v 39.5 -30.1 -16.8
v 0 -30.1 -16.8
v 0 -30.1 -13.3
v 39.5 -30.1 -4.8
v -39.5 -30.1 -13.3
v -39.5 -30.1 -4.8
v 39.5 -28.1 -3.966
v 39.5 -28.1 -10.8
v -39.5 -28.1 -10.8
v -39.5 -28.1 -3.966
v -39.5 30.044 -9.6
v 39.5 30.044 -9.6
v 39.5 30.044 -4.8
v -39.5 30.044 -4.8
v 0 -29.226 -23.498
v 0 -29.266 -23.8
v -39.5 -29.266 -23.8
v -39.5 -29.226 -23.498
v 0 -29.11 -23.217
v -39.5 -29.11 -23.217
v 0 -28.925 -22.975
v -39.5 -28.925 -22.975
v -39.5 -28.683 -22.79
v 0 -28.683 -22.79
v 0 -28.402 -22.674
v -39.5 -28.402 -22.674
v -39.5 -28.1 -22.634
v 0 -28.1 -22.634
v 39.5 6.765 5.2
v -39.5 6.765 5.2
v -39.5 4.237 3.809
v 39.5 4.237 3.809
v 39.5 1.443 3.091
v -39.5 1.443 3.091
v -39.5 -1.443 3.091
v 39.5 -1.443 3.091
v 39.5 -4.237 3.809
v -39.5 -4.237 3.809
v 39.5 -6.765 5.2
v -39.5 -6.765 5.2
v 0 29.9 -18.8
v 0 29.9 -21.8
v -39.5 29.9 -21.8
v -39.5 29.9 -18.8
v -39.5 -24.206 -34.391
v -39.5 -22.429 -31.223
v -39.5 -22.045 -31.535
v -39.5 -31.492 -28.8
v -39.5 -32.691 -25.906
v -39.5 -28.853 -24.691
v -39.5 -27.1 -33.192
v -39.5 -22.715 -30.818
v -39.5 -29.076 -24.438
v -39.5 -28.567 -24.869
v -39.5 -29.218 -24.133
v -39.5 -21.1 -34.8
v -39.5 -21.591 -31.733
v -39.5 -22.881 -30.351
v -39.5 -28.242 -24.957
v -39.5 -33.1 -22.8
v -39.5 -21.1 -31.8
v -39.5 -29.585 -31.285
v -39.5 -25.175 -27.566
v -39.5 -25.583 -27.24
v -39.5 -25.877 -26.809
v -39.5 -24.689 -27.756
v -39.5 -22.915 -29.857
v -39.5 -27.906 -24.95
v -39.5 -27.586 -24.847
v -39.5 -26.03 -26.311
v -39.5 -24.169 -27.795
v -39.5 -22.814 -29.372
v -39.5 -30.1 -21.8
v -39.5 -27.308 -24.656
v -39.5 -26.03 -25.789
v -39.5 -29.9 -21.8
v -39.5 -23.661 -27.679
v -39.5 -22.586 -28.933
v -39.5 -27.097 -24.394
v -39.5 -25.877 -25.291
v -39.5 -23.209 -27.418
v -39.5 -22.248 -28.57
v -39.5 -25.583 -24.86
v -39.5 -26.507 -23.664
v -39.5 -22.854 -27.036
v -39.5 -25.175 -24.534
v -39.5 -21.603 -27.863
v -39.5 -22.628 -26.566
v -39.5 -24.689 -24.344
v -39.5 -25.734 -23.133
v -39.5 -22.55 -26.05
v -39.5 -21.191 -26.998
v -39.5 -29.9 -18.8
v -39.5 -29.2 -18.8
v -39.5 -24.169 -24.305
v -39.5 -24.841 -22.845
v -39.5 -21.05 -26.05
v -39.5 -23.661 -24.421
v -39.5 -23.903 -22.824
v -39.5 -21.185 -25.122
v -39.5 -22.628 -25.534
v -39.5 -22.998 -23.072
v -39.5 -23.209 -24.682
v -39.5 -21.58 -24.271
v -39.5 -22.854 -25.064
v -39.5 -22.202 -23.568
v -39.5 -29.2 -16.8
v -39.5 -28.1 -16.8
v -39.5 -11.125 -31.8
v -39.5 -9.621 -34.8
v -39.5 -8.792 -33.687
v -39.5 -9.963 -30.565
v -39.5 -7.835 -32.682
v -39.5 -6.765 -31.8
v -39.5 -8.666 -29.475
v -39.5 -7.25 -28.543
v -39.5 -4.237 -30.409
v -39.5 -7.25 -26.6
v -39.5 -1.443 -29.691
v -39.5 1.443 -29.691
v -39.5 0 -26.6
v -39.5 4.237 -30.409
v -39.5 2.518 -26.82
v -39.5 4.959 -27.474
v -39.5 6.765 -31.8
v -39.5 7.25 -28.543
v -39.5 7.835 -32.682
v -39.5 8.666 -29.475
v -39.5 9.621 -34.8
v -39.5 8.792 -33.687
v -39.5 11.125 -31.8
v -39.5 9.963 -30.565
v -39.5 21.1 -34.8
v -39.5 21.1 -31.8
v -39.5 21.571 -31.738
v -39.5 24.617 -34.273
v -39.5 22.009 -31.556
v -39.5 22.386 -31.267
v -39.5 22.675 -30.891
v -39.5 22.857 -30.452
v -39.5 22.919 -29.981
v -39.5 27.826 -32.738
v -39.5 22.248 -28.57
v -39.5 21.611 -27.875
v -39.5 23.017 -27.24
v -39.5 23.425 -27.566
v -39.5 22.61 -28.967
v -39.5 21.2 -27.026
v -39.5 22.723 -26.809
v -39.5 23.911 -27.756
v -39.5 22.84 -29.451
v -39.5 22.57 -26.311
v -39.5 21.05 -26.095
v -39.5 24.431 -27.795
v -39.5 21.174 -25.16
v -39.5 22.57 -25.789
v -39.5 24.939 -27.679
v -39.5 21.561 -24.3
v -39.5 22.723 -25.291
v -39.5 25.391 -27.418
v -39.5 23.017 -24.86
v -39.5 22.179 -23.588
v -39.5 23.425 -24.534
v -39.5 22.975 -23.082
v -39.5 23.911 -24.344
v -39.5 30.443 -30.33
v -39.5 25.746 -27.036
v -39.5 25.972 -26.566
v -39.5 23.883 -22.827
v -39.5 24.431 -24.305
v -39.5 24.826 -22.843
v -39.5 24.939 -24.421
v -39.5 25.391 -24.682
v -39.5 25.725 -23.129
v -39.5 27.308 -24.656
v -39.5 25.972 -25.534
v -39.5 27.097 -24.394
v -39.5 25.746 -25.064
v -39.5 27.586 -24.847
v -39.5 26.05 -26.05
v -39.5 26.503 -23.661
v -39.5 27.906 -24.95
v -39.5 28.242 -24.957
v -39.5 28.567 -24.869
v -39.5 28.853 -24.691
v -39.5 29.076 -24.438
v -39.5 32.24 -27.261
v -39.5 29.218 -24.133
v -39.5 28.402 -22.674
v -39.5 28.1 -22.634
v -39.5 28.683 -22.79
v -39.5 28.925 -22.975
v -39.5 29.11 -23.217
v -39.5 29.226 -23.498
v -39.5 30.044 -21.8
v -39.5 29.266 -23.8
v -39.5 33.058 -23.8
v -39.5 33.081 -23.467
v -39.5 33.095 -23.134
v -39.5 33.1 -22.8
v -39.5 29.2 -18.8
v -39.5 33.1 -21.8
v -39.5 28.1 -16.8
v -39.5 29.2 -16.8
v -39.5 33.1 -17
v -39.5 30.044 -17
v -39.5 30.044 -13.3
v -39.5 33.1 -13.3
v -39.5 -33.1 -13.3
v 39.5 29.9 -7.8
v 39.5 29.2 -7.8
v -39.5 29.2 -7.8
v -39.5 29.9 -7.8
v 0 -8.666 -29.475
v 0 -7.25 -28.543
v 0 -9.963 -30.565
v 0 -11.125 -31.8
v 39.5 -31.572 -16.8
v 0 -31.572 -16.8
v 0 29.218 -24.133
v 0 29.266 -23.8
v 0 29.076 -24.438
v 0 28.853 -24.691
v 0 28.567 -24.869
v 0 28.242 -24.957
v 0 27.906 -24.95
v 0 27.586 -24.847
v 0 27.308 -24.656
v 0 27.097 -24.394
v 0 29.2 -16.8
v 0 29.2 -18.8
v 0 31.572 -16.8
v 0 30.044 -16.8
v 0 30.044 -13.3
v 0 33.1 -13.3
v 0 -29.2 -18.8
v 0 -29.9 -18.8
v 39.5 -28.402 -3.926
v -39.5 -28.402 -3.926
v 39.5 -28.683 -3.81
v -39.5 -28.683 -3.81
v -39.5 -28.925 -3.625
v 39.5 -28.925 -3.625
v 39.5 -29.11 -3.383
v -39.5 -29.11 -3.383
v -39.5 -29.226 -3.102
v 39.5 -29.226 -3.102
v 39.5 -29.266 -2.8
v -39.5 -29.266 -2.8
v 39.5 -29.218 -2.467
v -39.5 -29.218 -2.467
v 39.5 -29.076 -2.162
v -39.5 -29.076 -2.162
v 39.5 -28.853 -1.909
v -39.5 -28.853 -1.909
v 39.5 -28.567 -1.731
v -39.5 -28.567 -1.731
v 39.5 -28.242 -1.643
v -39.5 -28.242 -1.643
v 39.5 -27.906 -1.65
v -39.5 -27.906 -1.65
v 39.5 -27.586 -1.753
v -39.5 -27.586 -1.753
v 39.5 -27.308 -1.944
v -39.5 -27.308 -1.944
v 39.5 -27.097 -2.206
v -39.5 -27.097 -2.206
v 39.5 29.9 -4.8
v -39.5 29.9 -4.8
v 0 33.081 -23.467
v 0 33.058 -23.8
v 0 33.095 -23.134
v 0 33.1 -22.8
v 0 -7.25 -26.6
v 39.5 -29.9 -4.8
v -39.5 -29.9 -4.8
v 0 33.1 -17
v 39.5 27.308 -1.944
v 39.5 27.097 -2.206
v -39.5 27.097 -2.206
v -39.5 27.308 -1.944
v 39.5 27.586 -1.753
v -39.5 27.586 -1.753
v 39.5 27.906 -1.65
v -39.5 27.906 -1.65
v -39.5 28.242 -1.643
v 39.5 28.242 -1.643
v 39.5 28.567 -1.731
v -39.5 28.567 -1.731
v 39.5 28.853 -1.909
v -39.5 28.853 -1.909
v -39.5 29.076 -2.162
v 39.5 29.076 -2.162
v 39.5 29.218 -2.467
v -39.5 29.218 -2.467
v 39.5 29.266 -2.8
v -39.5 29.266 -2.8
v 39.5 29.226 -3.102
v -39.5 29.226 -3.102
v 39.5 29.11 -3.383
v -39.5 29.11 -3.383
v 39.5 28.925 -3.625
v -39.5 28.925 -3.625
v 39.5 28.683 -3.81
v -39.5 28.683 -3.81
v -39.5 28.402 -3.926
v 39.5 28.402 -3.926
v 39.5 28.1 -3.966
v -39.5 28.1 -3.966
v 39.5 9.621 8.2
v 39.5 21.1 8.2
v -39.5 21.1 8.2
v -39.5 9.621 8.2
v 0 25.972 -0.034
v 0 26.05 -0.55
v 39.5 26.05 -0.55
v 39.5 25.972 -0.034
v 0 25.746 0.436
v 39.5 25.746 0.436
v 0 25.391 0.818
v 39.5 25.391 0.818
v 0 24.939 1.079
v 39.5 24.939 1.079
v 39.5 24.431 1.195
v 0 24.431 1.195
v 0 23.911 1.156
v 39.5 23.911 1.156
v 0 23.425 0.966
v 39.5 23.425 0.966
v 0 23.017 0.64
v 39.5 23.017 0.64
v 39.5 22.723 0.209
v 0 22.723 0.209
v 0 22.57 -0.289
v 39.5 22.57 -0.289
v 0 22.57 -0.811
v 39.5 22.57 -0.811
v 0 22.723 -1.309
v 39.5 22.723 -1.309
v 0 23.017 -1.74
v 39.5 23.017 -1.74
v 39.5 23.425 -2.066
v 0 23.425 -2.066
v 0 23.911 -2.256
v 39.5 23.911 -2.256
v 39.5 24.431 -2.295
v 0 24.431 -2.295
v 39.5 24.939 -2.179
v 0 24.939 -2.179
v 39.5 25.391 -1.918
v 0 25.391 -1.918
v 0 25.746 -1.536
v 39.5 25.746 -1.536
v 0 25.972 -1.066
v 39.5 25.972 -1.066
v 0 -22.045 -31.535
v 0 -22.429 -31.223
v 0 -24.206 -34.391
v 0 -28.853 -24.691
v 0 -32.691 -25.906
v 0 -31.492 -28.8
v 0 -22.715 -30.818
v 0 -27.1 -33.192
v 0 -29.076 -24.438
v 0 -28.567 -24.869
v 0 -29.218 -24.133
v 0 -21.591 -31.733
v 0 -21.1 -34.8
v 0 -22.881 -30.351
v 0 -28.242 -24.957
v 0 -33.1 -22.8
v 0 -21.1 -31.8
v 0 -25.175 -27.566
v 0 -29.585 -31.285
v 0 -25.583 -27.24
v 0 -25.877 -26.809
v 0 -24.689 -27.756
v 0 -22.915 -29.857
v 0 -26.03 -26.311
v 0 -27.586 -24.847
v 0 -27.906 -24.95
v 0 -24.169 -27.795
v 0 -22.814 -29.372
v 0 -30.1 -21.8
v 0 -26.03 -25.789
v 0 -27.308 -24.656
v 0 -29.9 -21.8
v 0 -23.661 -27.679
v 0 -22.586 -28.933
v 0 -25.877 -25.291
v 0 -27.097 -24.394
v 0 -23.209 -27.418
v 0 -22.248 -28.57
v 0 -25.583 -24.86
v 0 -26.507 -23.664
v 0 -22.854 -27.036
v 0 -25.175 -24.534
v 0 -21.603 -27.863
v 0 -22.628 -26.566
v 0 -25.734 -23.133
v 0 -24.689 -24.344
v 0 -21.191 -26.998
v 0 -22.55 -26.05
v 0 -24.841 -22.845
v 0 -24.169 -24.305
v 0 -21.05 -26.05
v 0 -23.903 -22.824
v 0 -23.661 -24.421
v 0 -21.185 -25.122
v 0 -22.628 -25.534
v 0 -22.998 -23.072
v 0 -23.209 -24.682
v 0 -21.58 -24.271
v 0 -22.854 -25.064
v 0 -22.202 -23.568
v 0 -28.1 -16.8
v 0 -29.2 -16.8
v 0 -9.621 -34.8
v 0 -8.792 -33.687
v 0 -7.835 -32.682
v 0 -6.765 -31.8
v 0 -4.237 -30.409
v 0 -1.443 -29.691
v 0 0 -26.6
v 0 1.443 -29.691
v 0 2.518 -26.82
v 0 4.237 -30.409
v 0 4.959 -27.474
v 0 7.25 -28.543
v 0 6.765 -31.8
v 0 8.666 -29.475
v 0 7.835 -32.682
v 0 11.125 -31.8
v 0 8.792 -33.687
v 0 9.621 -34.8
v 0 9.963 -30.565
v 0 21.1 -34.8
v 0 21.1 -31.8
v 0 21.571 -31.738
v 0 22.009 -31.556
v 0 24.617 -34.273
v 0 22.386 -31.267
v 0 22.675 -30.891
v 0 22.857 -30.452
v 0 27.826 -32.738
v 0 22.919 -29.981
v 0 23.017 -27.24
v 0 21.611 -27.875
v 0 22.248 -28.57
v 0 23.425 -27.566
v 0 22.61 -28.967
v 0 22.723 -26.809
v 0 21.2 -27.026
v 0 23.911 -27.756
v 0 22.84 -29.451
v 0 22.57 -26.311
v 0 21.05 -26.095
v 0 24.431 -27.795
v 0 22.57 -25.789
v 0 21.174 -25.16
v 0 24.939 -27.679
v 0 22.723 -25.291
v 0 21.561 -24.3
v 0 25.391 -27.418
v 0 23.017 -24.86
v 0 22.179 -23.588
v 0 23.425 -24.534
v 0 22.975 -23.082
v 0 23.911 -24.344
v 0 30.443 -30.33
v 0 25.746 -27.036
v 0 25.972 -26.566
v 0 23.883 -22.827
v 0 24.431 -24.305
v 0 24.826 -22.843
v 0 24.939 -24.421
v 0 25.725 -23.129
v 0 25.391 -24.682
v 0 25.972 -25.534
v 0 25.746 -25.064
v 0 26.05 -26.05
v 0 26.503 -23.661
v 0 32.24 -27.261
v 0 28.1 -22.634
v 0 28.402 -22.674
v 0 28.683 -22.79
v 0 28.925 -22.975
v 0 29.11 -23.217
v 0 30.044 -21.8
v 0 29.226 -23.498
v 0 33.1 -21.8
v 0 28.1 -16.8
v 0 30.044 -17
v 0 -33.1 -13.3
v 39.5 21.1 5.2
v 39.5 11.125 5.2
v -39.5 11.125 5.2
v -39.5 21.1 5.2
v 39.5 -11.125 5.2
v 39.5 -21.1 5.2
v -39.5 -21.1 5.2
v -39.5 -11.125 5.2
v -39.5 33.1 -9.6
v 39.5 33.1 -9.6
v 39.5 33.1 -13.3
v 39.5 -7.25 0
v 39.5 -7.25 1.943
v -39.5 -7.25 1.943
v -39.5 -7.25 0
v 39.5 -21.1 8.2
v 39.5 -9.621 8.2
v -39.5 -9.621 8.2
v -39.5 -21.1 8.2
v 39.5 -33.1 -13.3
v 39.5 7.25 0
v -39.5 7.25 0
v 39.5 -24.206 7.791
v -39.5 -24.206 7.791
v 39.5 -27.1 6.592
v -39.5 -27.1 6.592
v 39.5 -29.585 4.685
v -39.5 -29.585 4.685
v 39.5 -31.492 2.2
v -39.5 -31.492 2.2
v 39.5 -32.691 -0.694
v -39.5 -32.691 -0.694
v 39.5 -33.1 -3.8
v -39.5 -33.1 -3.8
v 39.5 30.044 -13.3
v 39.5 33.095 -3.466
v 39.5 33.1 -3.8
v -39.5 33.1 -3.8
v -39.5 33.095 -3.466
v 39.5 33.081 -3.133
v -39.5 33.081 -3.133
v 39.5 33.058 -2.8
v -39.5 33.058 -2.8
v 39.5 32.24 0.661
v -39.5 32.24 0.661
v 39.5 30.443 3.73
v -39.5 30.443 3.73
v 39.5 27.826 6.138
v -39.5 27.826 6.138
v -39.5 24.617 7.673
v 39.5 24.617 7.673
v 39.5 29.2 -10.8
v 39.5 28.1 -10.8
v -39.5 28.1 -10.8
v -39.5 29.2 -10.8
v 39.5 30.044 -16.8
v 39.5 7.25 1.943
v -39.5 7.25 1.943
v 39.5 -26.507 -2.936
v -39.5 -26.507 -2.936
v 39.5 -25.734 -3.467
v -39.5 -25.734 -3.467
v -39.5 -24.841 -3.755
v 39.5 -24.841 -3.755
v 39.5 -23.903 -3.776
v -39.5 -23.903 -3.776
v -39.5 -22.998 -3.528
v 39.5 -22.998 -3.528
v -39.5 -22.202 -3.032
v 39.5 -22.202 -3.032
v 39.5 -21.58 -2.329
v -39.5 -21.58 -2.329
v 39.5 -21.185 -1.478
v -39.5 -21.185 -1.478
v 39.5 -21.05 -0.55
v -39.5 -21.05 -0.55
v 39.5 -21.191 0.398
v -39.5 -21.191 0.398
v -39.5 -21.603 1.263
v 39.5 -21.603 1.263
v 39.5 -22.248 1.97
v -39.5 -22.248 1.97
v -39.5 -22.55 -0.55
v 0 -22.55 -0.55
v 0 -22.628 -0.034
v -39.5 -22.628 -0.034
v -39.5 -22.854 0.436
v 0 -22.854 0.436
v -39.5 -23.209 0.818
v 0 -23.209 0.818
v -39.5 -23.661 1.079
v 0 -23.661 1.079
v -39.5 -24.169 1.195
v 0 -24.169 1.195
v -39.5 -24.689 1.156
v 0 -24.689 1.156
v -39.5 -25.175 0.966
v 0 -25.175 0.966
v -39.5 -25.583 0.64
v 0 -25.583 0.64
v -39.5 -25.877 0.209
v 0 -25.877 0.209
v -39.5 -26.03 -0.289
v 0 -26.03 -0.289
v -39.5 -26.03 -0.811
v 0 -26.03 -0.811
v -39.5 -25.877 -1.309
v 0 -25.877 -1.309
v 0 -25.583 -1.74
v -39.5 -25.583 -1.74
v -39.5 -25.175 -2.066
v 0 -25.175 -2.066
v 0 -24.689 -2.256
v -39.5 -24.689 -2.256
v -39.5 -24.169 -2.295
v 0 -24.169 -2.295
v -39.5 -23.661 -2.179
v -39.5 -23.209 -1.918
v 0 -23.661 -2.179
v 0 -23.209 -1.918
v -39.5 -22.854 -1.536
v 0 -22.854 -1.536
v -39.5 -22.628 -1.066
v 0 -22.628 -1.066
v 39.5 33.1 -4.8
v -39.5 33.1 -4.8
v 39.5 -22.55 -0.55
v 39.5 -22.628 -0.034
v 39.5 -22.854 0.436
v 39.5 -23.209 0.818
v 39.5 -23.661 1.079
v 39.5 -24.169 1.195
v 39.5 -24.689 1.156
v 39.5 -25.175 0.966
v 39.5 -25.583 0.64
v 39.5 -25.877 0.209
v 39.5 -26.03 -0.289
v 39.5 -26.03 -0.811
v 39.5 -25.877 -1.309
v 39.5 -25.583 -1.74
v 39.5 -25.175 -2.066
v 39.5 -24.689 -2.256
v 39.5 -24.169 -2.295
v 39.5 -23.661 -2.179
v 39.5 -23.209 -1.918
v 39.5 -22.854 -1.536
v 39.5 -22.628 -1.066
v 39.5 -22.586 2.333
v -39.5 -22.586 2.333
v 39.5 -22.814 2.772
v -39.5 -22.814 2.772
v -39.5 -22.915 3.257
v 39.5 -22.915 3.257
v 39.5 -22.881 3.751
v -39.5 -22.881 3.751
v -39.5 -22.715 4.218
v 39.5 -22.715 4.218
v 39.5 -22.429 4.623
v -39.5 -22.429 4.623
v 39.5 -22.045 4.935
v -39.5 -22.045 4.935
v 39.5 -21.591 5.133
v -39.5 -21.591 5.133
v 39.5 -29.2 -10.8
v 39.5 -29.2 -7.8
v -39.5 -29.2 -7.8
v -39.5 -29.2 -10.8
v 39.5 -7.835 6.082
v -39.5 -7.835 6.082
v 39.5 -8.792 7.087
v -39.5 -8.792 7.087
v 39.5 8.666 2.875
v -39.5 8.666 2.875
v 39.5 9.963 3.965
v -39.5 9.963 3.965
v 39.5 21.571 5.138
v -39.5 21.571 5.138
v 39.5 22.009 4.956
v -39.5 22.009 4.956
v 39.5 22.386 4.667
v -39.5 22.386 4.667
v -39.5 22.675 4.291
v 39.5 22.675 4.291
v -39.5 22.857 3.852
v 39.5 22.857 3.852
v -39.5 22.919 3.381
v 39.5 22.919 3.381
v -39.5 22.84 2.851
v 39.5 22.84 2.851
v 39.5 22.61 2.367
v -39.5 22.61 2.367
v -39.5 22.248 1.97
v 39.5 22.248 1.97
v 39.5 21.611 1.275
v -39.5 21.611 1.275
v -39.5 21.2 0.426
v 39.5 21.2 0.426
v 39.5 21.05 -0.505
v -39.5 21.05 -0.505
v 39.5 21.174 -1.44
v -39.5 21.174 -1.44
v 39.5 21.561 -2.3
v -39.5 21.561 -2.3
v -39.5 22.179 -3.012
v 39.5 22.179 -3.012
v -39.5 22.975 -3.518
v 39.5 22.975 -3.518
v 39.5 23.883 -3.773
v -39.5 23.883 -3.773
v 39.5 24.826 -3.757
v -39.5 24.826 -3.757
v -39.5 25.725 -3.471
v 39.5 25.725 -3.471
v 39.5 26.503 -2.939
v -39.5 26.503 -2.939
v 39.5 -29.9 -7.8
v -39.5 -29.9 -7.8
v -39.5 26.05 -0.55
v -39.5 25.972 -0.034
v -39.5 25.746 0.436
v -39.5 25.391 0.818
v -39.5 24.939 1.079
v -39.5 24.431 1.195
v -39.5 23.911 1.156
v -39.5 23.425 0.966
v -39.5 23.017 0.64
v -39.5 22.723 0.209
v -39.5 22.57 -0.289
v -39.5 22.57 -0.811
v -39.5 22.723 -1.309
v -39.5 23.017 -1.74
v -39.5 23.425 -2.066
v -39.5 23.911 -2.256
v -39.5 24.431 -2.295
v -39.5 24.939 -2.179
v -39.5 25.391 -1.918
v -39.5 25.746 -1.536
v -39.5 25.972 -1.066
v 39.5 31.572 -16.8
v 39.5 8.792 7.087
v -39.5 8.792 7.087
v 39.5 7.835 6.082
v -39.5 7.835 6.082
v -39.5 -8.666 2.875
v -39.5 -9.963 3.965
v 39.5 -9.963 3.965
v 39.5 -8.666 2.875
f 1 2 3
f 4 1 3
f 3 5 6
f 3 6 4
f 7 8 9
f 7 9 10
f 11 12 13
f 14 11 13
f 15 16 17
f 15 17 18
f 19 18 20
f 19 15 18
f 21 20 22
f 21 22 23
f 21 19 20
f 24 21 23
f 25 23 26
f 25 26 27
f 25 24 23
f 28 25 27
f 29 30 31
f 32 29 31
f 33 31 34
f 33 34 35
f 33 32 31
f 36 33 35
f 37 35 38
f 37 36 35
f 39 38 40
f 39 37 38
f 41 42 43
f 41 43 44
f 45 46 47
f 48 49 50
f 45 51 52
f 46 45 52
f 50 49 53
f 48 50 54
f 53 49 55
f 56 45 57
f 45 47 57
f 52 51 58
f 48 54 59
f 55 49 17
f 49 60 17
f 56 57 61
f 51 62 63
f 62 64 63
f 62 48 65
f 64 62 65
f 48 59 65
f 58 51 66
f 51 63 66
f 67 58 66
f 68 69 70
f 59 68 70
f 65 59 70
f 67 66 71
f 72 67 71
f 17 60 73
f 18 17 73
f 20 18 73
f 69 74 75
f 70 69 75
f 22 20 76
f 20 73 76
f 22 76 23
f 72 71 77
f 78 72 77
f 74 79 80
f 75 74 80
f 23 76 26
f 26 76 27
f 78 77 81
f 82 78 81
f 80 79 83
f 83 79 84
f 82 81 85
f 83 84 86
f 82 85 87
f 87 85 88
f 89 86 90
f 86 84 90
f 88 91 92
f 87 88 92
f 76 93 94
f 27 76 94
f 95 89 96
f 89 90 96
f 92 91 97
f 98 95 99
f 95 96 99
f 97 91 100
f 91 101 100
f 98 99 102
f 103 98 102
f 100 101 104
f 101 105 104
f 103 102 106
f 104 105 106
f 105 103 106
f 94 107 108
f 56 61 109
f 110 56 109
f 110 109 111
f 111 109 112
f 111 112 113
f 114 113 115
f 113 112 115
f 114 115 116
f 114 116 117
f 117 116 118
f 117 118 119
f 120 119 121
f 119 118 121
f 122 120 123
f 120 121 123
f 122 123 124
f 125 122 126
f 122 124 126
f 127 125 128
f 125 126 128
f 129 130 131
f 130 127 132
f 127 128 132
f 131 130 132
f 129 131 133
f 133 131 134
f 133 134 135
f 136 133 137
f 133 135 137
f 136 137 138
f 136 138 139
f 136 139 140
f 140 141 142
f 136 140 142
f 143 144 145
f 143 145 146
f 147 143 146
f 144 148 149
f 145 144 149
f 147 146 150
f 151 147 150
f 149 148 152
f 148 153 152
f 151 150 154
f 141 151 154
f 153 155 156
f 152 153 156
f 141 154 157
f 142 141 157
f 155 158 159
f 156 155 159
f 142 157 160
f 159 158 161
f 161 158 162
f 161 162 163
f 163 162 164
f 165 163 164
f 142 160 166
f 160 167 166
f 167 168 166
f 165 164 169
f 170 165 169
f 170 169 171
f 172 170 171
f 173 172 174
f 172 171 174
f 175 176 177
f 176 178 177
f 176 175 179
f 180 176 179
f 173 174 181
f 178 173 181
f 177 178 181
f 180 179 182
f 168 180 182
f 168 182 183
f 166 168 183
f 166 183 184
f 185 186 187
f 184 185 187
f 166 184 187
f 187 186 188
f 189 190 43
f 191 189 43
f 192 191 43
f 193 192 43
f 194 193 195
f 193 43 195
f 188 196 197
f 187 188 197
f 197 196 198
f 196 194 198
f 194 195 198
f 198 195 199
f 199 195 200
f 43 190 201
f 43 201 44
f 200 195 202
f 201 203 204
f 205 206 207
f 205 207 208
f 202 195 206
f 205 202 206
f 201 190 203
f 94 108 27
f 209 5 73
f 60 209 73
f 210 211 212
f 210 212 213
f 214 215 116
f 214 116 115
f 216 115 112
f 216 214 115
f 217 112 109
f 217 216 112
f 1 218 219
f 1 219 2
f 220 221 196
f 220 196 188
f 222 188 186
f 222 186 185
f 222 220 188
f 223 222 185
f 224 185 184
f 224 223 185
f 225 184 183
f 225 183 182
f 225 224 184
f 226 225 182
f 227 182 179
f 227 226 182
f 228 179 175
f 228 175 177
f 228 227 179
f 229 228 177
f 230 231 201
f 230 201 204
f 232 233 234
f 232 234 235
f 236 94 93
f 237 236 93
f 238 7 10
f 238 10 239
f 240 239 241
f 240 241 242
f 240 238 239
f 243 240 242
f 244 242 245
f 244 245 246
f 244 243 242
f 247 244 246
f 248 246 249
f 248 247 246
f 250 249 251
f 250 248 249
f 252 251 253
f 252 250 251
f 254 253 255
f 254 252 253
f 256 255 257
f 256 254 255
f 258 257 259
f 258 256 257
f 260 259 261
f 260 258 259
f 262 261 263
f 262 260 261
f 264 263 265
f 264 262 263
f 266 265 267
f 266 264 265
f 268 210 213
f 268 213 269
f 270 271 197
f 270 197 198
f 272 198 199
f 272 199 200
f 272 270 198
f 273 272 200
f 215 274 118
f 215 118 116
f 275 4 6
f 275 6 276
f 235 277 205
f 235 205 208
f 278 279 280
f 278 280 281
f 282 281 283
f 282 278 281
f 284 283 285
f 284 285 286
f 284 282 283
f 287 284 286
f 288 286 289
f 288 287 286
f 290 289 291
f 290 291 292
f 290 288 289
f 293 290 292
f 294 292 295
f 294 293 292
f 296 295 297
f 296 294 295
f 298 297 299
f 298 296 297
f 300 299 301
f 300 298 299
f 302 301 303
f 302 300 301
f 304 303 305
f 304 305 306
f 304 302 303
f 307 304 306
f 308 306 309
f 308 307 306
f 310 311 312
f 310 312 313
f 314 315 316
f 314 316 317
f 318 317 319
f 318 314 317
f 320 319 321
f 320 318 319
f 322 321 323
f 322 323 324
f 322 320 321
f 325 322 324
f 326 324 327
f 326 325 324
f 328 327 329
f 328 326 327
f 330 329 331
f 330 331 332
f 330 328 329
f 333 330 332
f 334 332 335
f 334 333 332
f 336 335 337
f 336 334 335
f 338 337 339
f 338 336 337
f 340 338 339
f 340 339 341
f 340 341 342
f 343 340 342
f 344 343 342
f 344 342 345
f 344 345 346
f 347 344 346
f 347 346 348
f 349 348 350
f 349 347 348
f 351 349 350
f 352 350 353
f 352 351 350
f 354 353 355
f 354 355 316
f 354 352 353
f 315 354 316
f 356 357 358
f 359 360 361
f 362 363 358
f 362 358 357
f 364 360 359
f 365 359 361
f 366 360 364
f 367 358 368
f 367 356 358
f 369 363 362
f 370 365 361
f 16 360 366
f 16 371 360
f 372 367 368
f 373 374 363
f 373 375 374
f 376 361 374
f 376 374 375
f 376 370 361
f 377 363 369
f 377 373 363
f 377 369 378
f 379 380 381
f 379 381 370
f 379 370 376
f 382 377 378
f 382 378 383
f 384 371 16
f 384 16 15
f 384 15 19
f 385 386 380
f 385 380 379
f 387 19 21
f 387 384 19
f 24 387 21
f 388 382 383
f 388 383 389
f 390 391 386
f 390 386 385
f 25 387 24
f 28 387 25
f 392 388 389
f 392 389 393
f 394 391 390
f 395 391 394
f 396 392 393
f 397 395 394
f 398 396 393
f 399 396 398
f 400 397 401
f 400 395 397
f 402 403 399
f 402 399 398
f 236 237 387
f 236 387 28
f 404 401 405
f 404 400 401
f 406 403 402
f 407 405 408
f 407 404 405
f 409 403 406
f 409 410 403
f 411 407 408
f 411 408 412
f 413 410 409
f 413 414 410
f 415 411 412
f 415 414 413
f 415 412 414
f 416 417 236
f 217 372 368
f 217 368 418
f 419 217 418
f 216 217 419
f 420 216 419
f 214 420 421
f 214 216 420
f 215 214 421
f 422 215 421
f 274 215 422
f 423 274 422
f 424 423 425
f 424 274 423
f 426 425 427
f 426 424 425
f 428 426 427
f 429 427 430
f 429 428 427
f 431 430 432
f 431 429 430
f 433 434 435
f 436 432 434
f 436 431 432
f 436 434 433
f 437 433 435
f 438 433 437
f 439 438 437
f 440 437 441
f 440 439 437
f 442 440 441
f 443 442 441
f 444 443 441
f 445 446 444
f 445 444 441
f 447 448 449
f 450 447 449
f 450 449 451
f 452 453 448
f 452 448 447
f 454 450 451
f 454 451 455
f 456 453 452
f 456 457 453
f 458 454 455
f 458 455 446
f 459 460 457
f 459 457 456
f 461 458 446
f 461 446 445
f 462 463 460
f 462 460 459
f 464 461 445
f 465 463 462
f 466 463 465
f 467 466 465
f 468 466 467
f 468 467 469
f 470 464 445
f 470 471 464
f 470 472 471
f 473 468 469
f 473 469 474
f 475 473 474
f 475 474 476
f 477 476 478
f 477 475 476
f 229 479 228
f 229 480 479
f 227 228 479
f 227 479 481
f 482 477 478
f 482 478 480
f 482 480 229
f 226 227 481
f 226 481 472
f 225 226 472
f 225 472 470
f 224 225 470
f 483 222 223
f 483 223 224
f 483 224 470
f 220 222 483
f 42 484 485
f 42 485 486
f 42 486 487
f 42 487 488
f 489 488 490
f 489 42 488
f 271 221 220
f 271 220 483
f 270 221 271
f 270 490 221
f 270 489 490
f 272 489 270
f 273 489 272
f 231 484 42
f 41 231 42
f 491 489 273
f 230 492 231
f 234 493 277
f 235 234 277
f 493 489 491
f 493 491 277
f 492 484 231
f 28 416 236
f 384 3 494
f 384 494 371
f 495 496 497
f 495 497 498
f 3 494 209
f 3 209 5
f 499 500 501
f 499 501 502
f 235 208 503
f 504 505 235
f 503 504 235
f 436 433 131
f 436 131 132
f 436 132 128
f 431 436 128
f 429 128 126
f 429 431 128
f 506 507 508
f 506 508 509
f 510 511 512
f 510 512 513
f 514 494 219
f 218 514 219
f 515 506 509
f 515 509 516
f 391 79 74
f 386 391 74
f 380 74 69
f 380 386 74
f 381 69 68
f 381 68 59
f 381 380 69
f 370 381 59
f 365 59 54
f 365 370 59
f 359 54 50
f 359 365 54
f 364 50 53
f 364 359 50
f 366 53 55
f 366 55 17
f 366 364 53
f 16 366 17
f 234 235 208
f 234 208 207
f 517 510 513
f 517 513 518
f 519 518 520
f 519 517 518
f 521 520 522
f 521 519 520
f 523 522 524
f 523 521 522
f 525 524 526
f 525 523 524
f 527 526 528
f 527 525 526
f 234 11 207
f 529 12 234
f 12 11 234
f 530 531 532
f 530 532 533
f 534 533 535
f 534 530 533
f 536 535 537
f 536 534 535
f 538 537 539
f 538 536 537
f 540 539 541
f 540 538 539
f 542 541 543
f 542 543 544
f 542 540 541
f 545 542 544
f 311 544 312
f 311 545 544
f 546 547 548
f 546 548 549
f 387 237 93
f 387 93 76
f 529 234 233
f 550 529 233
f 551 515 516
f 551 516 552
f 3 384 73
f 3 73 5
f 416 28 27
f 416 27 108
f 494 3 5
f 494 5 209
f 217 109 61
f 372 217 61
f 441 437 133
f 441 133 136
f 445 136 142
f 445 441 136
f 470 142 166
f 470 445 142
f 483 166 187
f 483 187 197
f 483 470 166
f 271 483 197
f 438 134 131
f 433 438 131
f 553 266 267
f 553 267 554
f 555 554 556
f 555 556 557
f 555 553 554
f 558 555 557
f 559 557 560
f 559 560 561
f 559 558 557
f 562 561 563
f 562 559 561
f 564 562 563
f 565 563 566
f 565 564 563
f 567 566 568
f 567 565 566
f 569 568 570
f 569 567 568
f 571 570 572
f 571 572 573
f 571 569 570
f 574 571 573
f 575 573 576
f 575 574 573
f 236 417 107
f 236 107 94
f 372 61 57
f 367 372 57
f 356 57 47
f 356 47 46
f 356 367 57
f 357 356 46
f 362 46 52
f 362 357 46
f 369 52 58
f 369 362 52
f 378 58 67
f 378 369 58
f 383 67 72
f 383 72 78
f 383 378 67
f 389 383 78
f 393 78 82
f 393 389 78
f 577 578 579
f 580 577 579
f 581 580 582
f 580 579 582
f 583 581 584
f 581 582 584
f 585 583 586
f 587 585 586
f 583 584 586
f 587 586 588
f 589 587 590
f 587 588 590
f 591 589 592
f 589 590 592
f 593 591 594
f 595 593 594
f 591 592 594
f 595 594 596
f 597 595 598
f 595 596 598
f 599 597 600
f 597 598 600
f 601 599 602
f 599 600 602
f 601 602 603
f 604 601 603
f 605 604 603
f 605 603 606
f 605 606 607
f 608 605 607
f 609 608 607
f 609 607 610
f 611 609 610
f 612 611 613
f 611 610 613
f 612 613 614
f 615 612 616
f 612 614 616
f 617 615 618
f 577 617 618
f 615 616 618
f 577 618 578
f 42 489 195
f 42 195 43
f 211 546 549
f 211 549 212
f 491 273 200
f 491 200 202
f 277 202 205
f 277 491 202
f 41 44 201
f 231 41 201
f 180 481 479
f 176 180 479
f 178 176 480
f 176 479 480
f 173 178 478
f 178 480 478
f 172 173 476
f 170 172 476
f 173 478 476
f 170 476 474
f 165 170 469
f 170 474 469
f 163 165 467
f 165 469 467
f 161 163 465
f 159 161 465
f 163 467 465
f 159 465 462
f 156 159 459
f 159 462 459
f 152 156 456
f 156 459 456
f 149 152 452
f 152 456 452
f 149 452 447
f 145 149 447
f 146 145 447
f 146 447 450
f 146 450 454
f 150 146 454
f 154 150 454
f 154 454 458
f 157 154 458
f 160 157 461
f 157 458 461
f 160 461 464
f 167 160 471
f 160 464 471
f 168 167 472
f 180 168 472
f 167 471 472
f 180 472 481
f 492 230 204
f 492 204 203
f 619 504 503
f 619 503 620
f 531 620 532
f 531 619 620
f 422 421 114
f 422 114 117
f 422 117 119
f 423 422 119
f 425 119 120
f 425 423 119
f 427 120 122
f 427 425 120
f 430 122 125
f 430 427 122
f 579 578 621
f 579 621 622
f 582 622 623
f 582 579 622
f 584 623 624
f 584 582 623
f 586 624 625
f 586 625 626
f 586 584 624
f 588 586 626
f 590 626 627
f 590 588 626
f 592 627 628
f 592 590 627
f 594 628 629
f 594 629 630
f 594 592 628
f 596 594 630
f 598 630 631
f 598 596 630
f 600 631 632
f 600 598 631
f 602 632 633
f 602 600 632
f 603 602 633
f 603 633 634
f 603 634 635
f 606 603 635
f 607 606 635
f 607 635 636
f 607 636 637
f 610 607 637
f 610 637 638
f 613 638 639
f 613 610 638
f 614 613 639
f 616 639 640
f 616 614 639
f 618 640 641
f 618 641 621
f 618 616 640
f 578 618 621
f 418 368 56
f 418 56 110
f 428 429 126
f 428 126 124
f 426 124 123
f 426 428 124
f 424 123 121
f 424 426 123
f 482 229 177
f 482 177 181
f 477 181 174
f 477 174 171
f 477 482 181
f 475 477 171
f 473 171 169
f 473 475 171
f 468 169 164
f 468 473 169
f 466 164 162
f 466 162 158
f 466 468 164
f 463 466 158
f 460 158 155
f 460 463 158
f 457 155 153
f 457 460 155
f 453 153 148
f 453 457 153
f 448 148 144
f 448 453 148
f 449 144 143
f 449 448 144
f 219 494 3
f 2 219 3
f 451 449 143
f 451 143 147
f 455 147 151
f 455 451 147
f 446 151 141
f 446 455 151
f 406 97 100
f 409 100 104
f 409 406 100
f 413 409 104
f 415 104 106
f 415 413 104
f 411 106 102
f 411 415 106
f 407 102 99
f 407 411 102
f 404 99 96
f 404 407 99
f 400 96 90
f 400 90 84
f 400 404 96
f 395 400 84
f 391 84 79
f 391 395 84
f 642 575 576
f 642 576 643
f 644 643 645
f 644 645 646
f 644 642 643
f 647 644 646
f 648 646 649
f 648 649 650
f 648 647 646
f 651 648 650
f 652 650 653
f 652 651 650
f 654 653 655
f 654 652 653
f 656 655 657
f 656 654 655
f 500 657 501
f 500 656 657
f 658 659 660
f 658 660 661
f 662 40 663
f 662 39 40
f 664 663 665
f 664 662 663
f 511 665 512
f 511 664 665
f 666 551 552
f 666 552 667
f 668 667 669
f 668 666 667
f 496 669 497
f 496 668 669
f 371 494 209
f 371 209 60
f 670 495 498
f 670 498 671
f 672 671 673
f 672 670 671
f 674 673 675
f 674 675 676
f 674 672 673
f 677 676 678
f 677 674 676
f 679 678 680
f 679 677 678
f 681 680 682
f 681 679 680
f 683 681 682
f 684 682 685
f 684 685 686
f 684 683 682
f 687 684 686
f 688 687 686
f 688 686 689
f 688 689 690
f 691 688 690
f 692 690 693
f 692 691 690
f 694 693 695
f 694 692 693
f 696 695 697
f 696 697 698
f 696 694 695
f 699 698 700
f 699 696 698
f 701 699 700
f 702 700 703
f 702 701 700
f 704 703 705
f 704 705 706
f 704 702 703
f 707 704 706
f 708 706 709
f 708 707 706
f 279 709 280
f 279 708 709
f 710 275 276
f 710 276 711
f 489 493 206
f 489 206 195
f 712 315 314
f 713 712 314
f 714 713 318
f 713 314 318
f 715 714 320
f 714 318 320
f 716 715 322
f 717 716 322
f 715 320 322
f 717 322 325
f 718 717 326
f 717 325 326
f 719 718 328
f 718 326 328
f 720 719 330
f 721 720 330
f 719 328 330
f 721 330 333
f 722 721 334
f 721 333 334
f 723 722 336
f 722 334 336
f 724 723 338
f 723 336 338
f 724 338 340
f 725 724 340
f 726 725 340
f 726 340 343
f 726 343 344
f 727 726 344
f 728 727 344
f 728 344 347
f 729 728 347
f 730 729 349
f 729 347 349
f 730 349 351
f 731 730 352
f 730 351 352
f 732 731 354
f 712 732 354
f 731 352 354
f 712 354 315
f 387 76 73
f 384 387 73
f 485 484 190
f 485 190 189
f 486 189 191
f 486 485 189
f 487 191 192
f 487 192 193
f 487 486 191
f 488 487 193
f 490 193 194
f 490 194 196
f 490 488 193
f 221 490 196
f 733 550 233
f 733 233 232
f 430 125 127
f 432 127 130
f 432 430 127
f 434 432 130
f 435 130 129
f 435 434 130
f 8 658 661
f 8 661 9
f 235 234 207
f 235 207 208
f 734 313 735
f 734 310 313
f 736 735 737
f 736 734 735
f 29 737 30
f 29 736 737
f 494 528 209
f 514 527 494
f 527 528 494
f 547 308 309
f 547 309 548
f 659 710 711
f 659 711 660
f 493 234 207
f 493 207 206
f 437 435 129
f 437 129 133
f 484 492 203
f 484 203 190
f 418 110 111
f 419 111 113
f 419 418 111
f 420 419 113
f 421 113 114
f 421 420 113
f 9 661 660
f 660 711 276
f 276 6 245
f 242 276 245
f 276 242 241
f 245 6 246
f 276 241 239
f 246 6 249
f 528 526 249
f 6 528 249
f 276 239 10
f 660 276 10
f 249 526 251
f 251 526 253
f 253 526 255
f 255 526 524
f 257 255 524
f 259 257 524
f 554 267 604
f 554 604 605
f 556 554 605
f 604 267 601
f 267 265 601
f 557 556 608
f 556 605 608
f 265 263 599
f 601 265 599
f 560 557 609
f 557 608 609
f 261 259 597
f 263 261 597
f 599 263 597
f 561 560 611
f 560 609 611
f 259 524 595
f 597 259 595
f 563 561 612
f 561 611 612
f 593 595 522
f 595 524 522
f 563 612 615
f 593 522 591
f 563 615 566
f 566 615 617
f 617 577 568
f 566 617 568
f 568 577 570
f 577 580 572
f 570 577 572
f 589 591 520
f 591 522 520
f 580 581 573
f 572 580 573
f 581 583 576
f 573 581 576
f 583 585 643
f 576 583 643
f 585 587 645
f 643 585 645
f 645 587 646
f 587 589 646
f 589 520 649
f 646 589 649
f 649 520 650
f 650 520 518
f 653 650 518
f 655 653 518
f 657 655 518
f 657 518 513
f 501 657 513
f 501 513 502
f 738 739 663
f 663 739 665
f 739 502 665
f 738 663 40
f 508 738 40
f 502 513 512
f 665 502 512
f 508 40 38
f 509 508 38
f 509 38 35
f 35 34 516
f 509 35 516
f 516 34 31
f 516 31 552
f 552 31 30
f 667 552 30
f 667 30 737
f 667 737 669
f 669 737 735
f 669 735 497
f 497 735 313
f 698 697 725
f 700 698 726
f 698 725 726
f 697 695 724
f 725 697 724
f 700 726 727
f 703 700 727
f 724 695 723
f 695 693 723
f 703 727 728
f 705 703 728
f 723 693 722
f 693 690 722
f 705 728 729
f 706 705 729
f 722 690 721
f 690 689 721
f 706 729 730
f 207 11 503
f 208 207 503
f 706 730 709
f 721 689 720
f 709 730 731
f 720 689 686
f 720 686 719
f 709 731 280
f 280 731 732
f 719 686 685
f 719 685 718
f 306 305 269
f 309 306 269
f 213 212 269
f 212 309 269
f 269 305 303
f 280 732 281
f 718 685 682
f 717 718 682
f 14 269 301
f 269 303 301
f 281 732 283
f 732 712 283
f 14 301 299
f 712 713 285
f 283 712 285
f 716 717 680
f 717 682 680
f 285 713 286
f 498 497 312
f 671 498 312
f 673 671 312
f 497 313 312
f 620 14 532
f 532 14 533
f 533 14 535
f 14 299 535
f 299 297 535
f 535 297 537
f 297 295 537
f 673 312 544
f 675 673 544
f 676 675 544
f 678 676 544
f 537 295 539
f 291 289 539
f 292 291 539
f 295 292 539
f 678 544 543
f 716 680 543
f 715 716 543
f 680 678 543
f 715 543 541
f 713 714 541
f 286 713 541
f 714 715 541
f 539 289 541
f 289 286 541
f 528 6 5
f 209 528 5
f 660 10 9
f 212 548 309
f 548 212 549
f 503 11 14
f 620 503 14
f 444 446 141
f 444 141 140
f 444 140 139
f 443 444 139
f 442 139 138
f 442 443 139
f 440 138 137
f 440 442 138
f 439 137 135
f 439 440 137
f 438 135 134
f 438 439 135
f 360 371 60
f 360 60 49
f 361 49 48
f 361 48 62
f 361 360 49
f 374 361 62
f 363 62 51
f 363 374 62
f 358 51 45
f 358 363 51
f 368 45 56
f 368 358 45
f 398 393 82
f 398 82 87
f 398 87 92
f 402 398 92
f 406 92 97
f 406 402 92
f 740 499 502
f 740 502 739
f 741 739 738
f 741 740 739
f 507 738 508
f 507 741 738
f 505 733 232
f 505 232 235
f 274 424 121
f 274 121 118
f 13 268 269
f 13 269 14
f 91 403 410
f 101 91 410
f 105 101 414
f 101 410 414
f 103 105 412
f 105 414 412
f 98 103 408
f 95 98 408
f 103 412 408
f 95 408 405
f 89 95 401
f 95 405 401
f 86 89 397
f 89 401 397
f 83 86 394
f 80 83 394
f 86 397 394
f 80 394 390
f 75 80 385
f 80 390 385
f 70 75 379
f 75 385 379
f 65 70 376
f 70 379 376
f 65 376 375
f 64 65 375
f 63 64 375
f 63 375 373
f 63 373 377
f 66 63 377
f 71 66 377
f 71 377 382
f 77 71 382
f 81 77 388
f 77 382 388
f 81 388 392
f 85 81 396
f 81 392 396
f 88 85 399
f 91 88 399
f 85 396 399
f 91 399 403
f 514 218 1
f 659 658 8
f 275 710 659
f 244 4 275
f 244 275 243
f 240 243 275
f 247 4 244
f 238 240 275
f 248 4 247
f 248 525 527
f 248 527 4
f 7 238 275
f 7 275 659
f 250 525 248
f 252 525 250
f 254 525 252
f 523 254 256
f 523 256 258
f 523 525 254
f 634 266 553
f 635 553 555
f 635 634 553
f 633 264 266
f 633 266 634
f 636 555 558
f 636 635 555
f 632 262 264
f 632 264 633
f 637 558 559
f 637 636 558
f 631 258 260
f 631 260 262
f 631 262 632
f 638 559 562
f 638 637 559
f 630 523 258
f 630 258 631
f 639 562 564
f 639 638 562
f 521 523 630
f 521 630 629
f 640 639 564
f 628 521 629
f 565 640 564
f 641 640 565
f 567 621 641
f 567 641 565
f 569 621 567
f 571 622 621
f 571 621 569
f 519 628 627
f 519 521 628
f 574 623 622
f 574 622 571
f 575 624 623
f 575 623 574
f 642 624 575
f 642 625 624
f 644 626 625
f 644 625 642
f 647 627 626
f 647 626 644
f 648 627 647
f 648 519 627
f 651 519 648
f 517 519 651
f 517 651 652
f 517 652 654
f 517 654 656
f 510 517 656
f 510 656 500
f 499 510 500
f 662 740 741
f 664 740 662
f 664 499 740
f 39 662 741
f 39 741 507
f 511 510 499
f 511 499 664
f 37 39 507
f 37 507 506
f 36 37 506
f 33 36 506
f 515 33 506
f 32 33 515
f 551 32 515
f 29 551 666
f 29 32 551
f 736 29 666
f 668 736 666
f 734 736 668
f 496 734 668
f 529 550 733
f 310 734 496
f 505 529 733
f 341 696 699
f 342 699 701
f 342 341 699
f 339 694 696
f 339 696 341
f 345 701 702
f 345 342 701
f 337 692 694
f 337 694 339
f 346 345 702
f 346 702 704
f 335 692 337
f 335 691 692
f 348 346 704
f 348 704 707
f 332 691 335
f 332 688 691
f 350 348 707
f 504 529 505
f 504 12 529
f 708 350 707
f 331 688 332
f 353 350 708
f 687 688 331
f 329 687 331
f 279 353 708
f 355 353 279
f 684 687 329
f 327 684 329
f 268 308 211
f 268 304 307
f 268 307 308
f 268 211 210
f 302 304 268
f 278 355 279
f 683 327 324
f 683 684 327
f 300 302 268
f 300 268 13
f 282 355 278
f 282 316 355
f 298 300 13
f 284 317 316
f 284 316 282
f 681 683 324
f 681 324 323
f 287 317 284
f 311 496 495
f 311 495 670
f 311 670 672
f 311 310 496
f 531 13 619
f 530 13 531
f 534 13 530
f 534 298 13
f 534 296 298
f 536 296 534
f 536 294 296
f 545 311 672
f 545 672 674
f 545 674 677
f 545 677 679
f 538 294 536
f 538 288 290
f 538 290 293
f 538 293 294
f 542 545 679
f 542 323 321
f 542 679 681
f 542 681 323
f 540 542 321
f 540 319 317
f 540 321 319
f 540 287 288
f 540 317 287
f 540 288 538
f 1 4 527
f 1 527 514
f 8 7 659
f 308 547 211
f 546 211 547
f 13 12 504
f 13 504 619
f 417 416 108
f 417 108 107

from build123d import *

# Parameters (mm, degrees)
F0_R     = 1.75
F0_W     = 3.0557280899
F0_H     = 4.8
F0_W_2   = 1.1
F0_H_2   = 1.0000000006
F1_DEPTH = 39.5
F2_DEPTH = 39.5
F3_DEPTH = 39.5


with BuildPart() as f1:
    # F0 (on Right) → F1 (new body, symmetric)
    with BuildSketch(Plane.YZ):
        with BuildLine():
            Line((-9.6208107766, 8.2), (-13.0598621739, 8.2))
            ThreePointArc((-13.0598621739, 8.2), (-12.184983894, 6.6402183553), (-11.1247471881, 5.2))
            Line((-11.1247471881, 5.2), (-6.7646138101, 5.2))
            ThreePointArc((-6.7646138101, 5.2), (-8.3288975694, 6.5703426759), (-9.6208107766, 8.2))
        make_face()
        with BuildLine():
            Line((-6.7646138101, 5.2), (-11.1247471881, 5.2))
            ThreePointArc((-11.1247471881, 5.2), (-9.3306187205, 3.400921016), (-7.25, 1.9426316451))
            Line((-7.25, 1.9426316451), (7.25, 1.9426316451))
            ThreePointArc((7.25, 1.9426316451), (9.3306187205, 3.400921016), (11.1247471881, 5.2))
            Line((11.1247471881, 5.2), (6.7646138101, 5.2))
            ThreePointArc((6.7646138101, 5.2), (0, 3), (-6.7646138101, 5.2))
        make_face()
        with BuildLine():
            ThreePointArc((0, 0), (-3.752876154, 0.4940755188), (-7.25, 1.9426316451))
            Line((-7.25, 1.9426316451), (-7.25, 0))
            Line((-7.25, 0), (0, 0))
        make_face()
        with BuildLine():
            Line((7.25, 1.9426316451), (-7.25, 1.9426316451))
            ThreePointArc((-7.25, 1.9426316451), (-3.752876154, 0.4940755188), (0, 0))
            ThreePointArc((0, 0), (3.752876154, 0.4940755188), (7.25, 1.9426316451))
        make_face()
        with BuildLine():
            ThreePointArc((7.25, 1.9426316451), (3.752876154, 0.4940755188), (0, 0))
            Line((0, 0), (7.25, 0))
            Line((7.25, 0), (7.25, 1.9426316451))
        make_face()
        with BuildLine():
            Line((13.0598621739, 8.2), (9.6208107766, 8.2))
            ThreePointArc((9.6208107766, 8.2), (8.3288975694, 6.5703426759), (6.7646138101, 5.2))
            Line((6.7646138101, 5.2), (11.1247471881, 5.2))
            ThreePointArc((11.1247471881, 5.2), (12.184983894, 6.6402183553), (13.0598621739, 8.2))
        make_face()
        with BuildLine():
            Line((21.1, 8.2), (13.0598621739, 8.2))
            ThreePointArc((13.0598621739, 8.2), (12.184983894, 6.6402183553), (11.1247471881, 5.2))
            Line((11.1247471881, 5.2), (21.1, 5.2))
            ThreePointArc((21.1, 5.2), (27.1000000002, 2.9082039323), (30.0442719101, -2.8000000006))
            Line((30.0442719101, -2.8000000006), (33.0582607432, -2.8000000006))
            ThreePointArc((33.0582607432, -2.8000000006), (29.2240384049, 5.0317608661), (21.1, 8.2))
        make_face()
        with BuildLine():
            ThreePointArc((27.55, -0.55), (27.4345869955, -1.4084080426), (27.0965450045, -2.2058490383))
            ThreePointArc((27.0965450045, -2.2058490383), (28.4080135636, -1.6752489443), (29.2661634937, -2.8000000006))
            Line((29.2661634937, -2.8000000006), (30.0442719101, -2.8000000006))
            ThreePointArc((30.0442719101, -2.8000000006), (27.1000000002, 2.9082039323), (21.1, 5.2))
            ThreePointArc((21.1, 5.2), (22.3861486676, 4.6672597787), (22.9188888889, 3.3811111111))
            ThreePointArc((22.9188888889, 3.3811111111), (22.7427003625, 2.6001550885), (22.2482681457, 1.9704952684))
            ThreePointArc((22.2482681457, 1.9704952684), (25.6954159727, 2.3851855586), (27.55, -0.55))
        make_face()
        with BuildLine():
            ThreePointArc((22.2482681457, 1.9704952684), (22.1788801073, -3.0123871346), (27.0965450045, -2.2058490383))
            ThreePointArc((27.0965450045, -2.2058490383), (27.4345869955, -1.4084080426), (27.55, -0.55))
            ThreePointArc((27.55, -0.55), (25.6954159727, 2.3851855586), (22.2482681457, 1.9704952684))
        make_face()
        with Locations((24.3, -0.55)):
            Circle(F0_R, mode=Mode.SUBTRACT)
        with BuildLine():
            Line((28.1, -3.9661634942), (28.1, -9.8))
            Line((28.1, -9.8), (29.2, -9.8))
            Line((29.2, -9.8), (29.2, -7.8000000006))
            Line((29.2, -7.8000000006), (29.9, -7.8000000006))
            Line((29.9, -7.8000000006), (29.9, -4.8000000006))
            Line((29.9, -4.8000000006), (30.0442719101, -4.8000000006))
            Line((30.0442719101, -4.8000000006), (30.0442719101, -2.8000000006))
            Line((30.0442719101, -2.8000000006), (29.2661634937, -2.8000000006))
            ThreePointArc((29.2661634937, -2.8000000006), (28.9246021143, -3.6246021149), (28.1, -3.9661634942))
        make_face()
        with BuildLine():
            Line((33.0582607432, -2.8000000006), (30.0442719101, -2.8000000006))
            Line((30.0442719101, -2.8000000006), (30.0442719101, -4.8000000006))
            Line((30.0442719101, -4.8000000006), (33.1, -4.8000000006))
            Line((33.1, -4.8000000006), (33.1, -3.8))
            ThreePointArc((33.1, -3.8), (33.0895606449, -3.2995646484), (33.0582607432, -2.8000000006))
        make_face()
        with Locations((31.572135955, -7.2000000006)):
            Rectangle(F0_W, F0_H)
        Polygon((30.0442719101, -9.6000000006), (30.0442719101, -9.8), (31.572135955, -9.8), (33.1, -9.8), (33.1, -9.6000000006), align=None)
        with BuildLine():
            Line((-33.1, -3.8), (-33.1, -4.8000000006))
            Line((-33.1, -4.8000000006), (-30.1, -4.8000000006))
            Line((-30.1, -4.8000000006), (-30.1, -3.8))
            ThreePointArc((-30.1, -3.8), (-30.0860571774, -3.2992241972), (-30.0442719101, -2.8000000006))
            ThreePointArc((-30.0442719101, -2.8000000006), (-27.1000000002, 2.9082039323), (-21.1, 5.2))
            Line((-21.1, 5.2), (-11.1247471881, 5.2))
            ThreePointArc((-11.1247471881, 5.2), (-12.184983894, 6.6402183553), (-13.0598621739, 8.2))
            Line((-13.0598621739, 8.2), (-21.1, 8.2))
            ThreePointArc((-21.1, 8.2), (-29.5852813742, 4.6852813742), (-33.1, -3.8))
        make_face()
        with BuildLine():
            ThreePointArc((-21.1, 5.2), (-27.1000000002, 2.9082039323), (-30.0442719101, -2.8000000006))
            Line((-30.0442719101, -2.8000000006), (-29.2661634937, -2.8000000006))
            ThreePointArc((-29.2661634937, -2.8000000006), (-28.4080135888, -1.6752489512), (-27.0965450312, -2.2058489932))
            ThreePointArc((-27.0965450312, -2.2058489932), (-26.4211198756, 1.9123871494), (-22.2482681512, 1.9704952729))
            ThreePointArc((-22.2482681512, 1.9704952729), (-22.813783864, 3.9904563809), (-21.1, 5.2))
        make_face()
        with BuildLine():
            ThreePointArc((-21.05, -0.55), (-21.364814443, 0.8454159759), (-22.2482681512, 1.9704952729))
            ThreePointArc((-22.2482681512, 1.9704952729), (-26.4211198756, 1.9123871494), (-27.0965450312, -2.2058489932))
            ThreePointArc((-27.0965450312, -2.2058489932), (-23.4415919826, -3.6845870024), (-21.05, -0.55))
        make_face()
        with Locations((-24.3, -0.55)):
            Circle(F0_R, mode=Mode.SUBTRACT)
        with Locations((-28.65, -10.3000000003)):
            Rectangle(F0_W_2, F0_H_2)
        Polygon((-31.572135955, -9.8), (-33.1, -13.3), (-30.1, -13.3), (-30.1, -9.8), align=None)
        with BuildLine():
            Line((-30.1, -3.8), (-30.1, -4.8000000006))
            Line((-30.1, -4.8000000006), (-29.9, -4.8000000006))
            Line((-29.9, -4.8000000006), (-29.9, -7.8000000006))
            Line((-29.9, -7.8000000006), (-29.2, -7.8000000006))
            Line((-29.2, -7.8000000006), (-29.2, -9.8))
            Line((-29.2, -9.8), (-28.1, -9.8))
            Line((-28.1, -9.8), (-28.1, -3.9661634942))
            ThreePointArc((-28.1, -3.9661634942), (-28.9246021143, -3.6246021149), (-29.2661634937, -2.8000000006))
            Line((-29.2661634937, -2.8000000006), (-30.0442719101, -2.8000000006))
            ThreePointArc((-30.0442719101, -2.8000000006), (-30.0860571774, -3.2992241972), (-30.1, -3.8))
        make_face()
        Polygon((-33.1, -4.8000000006), (-33.1, -9.8), (-31.572135955, -9.8), (-30.1, -9.8), (-30.1, -4.8000000006), align=None)
        Polygon((-31.572135955, -9.8), (-33.1, -13.3), (-30.1, -13.3), (-30.1, -9.8), align=None)
        Polygon((-33.1, -9.8), (-33.1, -13.3), (-31.572135955, -9.8), align=None)
        Polygon((31.572135955, -9.8), (30.0442719101, -9.8), (30.0442719101, -13.3), (33.1, -13.3), align=None)
        Polygon((33.1, -9.8), (31.572135955, -9.8), (33.1, -13.3), align=None)
        with Locations((28.65, -10.3000000003)):
            Rectangle(F0_W_2, F0_H_2)
    extrude(amount=F1_DEPTH, both=True)

    # F0 (on Right) → F2 (join, through all)
    with BuildSketch(Plane.YZ):
        Polygon((-30.1, -13.3), (-33.1, -13.3), (-31.572135955, -16.8), (-30.1, -16.8), align=None)
        Polygon((30.0442719101, -13.3), (30.0442719101, -16.8), (31.572135955, -16.8), (33.1, -13.3), align=None)
    extrude(amount=F2_DEPTH)


with BuildPart() as f3:
    # F0 (on Right) → F3 (new body, through all)
    with BuildSketch(Plane.YZ):
        Polygon((-30.1, -13.3), (-33.1, -13.3), (-31.572135955, -16.8), (-30.1, -16.8), align=None)
        Polygon((-33.1, -13.3), (-33.1, -16.8), (-31.572135955, -16.8), align=None)
        Polygon((-31.572135955, -16.8), (-33.1, -16.8), (-33.1, -21.7999999994), (-30.1, -21.7999999994), (-30.1, -16.8), align=None)
        Polygon((33.1, -13.3), (31.572135955, -16.8), (33.1, -16.8), align=None)
        Polygon((30.0442719101, -13.3), (30.0442719101, -16.8), (31.572135955, -16.8), (33.1, -13.3), align=None)
        with Locations((31.572135955, -19.3999999994)):
            Rectangle(F0_W, F0_H)
        with BuildLine():
            Line((30.0442719101, -21.7999999994), (30.0442719101, -23.7999999994))
            Line((30.0442719101, -23.7999999994), (33.0582607432, -23.7999999994))
            ThreePointArc((33.0582607432, -23.7999999994), (33.0895606449, -23.3004353516), (33.1, -22.8))
            Line((33.1, -22.8), (33.1, -21.7999999994))
            Line((33.1, -21.7999999994), (30.0442719101, -21.7999999994))
        make_face()
        with BuildLine():
            Line((29.2, -16.8), (28.1, -16.8))
            Line((28.1, -16.8), (28.1, -22.6338365058))
            ThreePointArc((28.1, -22.6338365058), (28.9246021143, -22.9753978851), (29.2661634937, -23.7999999994))
            Line((29.2661634937, -23.7999999994), (30.0442719101, -23.7999999994))
            Line((30.0442719101, -23.7999999994), (30.0442719101, -21.7999999994))
            Line((30.0442719101, -21.7999999994), (29.9, -21.7999999994))
            Line((29.9, -21.7999999994), (29.9, -18.7999999994))
            Line((29.9, -18.7999999994), (29.2, -18.7999999994))
            Line((29.2, -18.7999999994), (29.2, -16.8))
        make_face()
        with BuildLine():
            ThreePointArc((11.1247471881, -31.8), (12.184983894, -33.2402183553), (13.0598621739, -34.8))
            Line((13.0598621739, -34.8), (21.1, -34.8))
            ThreePointArc((21.1, -34.8), (29.2240384049, -31.6317608661), (33.0582607432, -23.7999999994))
            Line((33.0582607432, -23.7999999994), (30.0442719101, -23.7999999994))
            ThreePointArc((30.0442719101, -23.7999999994), (27.1000000002, -29.5082039323), (21.1, -31.8))
            Line((21.1, -31.8), (11.1247471881, -31.8))
        make_face()
        with BuildLine():
            Line((30.0442719101, -23.7999999994), (29.2661634937, -23.7999999994))
            ThreePointArc((29.2661634937, -23.7999999994), (28.4080135131, -24.9247510695), (27.0965449512, -24.3941508716))
            ThreePointArc((27.0965449512, -24.3941508716), (27.4345869817, -25.1915919069), (27.55, -26.05))
            ThreePointArc((27.55, -26.05), (25.695416047, -28.9851855232), (22.2482682734, -28.5704953724))
            ThreePointArc((22.2482682734, -28.5704953724), (22.7427003978, -29.2001551629), (22.9188888889, -29.9811111111))
            ThreePointArc((22.9188888889, -29.9811111111), (22.3861486676, -31.2672597787), (21.1, -31.8))
            ThreePointArc((21.1, -31.8), (27.1000000002, -29.5082039323), (30.0442719101, -23.7999999994))
        make_face()
        with BuildLine():
            ThreePointArc((27.55, -26.05), (27.4345869817, -25.1915919069), (27.0965449512, -24.3941508716))
            ThreePointArc((27.0965449512, -24.3941508716), (22.1788800052, -23.5876129533), (22.2482682734, -28.5704953724))
            ThreePointArc((22.2482682734, -28.5704953724), (25.695416047, -28.9851855232), (27.55, -26.05))
        make_face()
        with Locations((24.3, -26.05)):
            Circle(F0_R, mode=Mode.SUBTRACT)
        with BuildLine():
            ThreePointArc((6.7646138101, -31.8), (8.3288975694, -33.1703426759), (9.6208107766, -34.8))
            Line((9.6208107766, -34.8), (13.0598621739, -34.8))
            ThreePointArc((13.0598621739, -34.8), (12.184983894, -33.2402183553), (11.1247471881, -31.8))
            Line((11.1247471881, -31.8), (6.7646138101, -31.8))
        make_face()
        with BuildLine():
            ThreePointArc((-7.25, -28.5426316451), (-9.3306187205, -30.000921016), (-11.1247471881, -31.8))
            Line((-11.1247471881, -31.8), (-6.7646138101, -31.8))
            ThreePointArc((-6.7646138101, -31.8), (0, -29.6), (6.7646138101, -31.8))
            Line((6.7646138101, -31.8), (11.1247471881, -31.8))
            ThreePointArc((11.1247471881, -31.8), (9.3306187205, -30.000921016), (7.25, -28.5426316451))
            Line((7.25, -28.5426316451), (-7.25, -28.5426316451))
        make_face()
        with BuildLine():
            ThreePointArc((0, -26.6), (-3.752876154, -27.0940755188), (-7.25, -28.5426316451))
            Line((-7.25, -28.5426316451), (7.25, -28.5426316451))
            ThreePointArc((7.25, -28.5426316451), (3.752876154, -27.0940755188), (0, -26.6))
        make_face()
        with BuildLine():
            Line((-7.25, -26.6), (-7.25, -28.5426316451))
            ThreePointArc((-7.25, -28.5426316451), (-3.752876154, -27.0940755188), (0, -26.6))
            Line((0, -26.6), (-7.25, -26.6))
        make_face()
        with BuildLine():
            ThreePointArc((-11.1247471881, -31.8), (-12.184983894, -33.2402183553), (-13.0598621739, -34.8))
            Line((-13.0598621739, -34.8), (-9.6208107766, -34.8))
            ThreePointArc((-9.6208107766, -34.8), (-8.3288975694, -33.1703426759), (-6.7646138101, -31.8))
            Line((-6.7646138101, -31.8), (-11.1247471881, -31.8))
        make_face()
        with BuildLine():
            Line((-30.1, -21.7999999994), (-33.1, -21.7999999994))
            Line((-33.1, -21.7999999994), (-33.1, -22.8))
            ThreePointArc((-33.1, -22.8), (-29.5852813742, -31.2852813742), (-21.1, -34.8))
            Line((-21.1, -34.8), (-13.0598621739, -34.8))
            ThreePointArc((-13.0598621739, -34.8), (-12.184983894, -33.2402183553), (-11.1247471881, -31.8))
            Line((-11.1247471881, -31.8), (-21.1, -31.8))
            ThreePointArc((-21.1, -31.8), (-27.1000000002, -29.5082039323), (-30.0442719101, -23.7999999994))
            ThreePointArc((-30.0442719101, -23.7999999994), (-30.0860571774, -23.3007758028), (-30.1, -22.8))
            Line((-30.1, -22.8), (-30.1, -21.7999999994))
        make_face()
        with BuildLine():
            Line((-29.2661634937, -23.7999999994), (-30.0442719101, -23.7999999994))
            ThreePointArc((-30.0442719101, -23.7999999994), (-27.1000000002, -29.5082039323), (-21.1, -31.8))
            ThreePointArc((-21.1, -31.8), (-22.8137838244, -30.5904564922), (-22.2482683345, -28.5704954221))
            ThreePointArc((-22.2482683345, -28.5704954221), (-26.4211199433, -28.512387091), (-27.0965450605, -24.3941510562))
            ThreePointArc((-27.0965450605, -24.3941510562), (-28.4080136166, -24.9247510412), (-29.2661634937, -23.7999999994))
        make_face()
        with BuildLine():
            ThreePointArc((-21.05, -26.05), (-23.4415920104, -22.91541299), (-27.0965450605, -24.3941510562))
            ThreePointArc((-27.0965450605, -24.3941510562), (-26.4211199433, -28.512387091), (-22.2482683345, -28.5704954221))
            ThreePointArc((-22.2482683345, -28.5704954221), (-21.3648144937, -27.4454160826), (-21.05, -26.05))
        make_face()
        with Locations((-24.3, -26.05)):
            Circle(F0_R, mode=Mode.SUBTRACT)
        with BuildLine():
            Line((-29.9, -21.7999999994), (-30.1, -21.7999999994))
            Line((-30.1, -21.7999999994), (-30.1, -22.8))
            ThreePointArc((-30.1, -22.8), (-30.0860571774, -23.3007758028), (-30.0442719101, -23.7999999994))
            Line((-30.0442719101, -23.7999999994), (-29.2661634937, -23.7999999994))
            ThreePointArc((-29.2661634937, -23.7999999994), (-28.9246021143, -22.9753978851), (-28.1, -22.6338365058))
            Line((-28.1, -22.6338365058), (-28.1, -16.8))
            Line((-28.1, -16.8), (-29.2, -16.8))
            Line((-29.2, -16.8), (-29.2, -18.7999999994))
            Line((-29.2, -18.7999999994), (-29.9, -18.7999999994))
            Line((-29.9, -18.7999999994), (-29.9, -21.7999999994))
        make_face()
        Polygon((31.572135955, -16.8), (30.0442719101, -16.8), (30.0442719101, -16.9999999994), (33.1, -16.9999999994), (33.1, -16.8), align=None)
    extrude(amount=-F3_DEPTH)


solid = Compound([f1.part, f3.part])
